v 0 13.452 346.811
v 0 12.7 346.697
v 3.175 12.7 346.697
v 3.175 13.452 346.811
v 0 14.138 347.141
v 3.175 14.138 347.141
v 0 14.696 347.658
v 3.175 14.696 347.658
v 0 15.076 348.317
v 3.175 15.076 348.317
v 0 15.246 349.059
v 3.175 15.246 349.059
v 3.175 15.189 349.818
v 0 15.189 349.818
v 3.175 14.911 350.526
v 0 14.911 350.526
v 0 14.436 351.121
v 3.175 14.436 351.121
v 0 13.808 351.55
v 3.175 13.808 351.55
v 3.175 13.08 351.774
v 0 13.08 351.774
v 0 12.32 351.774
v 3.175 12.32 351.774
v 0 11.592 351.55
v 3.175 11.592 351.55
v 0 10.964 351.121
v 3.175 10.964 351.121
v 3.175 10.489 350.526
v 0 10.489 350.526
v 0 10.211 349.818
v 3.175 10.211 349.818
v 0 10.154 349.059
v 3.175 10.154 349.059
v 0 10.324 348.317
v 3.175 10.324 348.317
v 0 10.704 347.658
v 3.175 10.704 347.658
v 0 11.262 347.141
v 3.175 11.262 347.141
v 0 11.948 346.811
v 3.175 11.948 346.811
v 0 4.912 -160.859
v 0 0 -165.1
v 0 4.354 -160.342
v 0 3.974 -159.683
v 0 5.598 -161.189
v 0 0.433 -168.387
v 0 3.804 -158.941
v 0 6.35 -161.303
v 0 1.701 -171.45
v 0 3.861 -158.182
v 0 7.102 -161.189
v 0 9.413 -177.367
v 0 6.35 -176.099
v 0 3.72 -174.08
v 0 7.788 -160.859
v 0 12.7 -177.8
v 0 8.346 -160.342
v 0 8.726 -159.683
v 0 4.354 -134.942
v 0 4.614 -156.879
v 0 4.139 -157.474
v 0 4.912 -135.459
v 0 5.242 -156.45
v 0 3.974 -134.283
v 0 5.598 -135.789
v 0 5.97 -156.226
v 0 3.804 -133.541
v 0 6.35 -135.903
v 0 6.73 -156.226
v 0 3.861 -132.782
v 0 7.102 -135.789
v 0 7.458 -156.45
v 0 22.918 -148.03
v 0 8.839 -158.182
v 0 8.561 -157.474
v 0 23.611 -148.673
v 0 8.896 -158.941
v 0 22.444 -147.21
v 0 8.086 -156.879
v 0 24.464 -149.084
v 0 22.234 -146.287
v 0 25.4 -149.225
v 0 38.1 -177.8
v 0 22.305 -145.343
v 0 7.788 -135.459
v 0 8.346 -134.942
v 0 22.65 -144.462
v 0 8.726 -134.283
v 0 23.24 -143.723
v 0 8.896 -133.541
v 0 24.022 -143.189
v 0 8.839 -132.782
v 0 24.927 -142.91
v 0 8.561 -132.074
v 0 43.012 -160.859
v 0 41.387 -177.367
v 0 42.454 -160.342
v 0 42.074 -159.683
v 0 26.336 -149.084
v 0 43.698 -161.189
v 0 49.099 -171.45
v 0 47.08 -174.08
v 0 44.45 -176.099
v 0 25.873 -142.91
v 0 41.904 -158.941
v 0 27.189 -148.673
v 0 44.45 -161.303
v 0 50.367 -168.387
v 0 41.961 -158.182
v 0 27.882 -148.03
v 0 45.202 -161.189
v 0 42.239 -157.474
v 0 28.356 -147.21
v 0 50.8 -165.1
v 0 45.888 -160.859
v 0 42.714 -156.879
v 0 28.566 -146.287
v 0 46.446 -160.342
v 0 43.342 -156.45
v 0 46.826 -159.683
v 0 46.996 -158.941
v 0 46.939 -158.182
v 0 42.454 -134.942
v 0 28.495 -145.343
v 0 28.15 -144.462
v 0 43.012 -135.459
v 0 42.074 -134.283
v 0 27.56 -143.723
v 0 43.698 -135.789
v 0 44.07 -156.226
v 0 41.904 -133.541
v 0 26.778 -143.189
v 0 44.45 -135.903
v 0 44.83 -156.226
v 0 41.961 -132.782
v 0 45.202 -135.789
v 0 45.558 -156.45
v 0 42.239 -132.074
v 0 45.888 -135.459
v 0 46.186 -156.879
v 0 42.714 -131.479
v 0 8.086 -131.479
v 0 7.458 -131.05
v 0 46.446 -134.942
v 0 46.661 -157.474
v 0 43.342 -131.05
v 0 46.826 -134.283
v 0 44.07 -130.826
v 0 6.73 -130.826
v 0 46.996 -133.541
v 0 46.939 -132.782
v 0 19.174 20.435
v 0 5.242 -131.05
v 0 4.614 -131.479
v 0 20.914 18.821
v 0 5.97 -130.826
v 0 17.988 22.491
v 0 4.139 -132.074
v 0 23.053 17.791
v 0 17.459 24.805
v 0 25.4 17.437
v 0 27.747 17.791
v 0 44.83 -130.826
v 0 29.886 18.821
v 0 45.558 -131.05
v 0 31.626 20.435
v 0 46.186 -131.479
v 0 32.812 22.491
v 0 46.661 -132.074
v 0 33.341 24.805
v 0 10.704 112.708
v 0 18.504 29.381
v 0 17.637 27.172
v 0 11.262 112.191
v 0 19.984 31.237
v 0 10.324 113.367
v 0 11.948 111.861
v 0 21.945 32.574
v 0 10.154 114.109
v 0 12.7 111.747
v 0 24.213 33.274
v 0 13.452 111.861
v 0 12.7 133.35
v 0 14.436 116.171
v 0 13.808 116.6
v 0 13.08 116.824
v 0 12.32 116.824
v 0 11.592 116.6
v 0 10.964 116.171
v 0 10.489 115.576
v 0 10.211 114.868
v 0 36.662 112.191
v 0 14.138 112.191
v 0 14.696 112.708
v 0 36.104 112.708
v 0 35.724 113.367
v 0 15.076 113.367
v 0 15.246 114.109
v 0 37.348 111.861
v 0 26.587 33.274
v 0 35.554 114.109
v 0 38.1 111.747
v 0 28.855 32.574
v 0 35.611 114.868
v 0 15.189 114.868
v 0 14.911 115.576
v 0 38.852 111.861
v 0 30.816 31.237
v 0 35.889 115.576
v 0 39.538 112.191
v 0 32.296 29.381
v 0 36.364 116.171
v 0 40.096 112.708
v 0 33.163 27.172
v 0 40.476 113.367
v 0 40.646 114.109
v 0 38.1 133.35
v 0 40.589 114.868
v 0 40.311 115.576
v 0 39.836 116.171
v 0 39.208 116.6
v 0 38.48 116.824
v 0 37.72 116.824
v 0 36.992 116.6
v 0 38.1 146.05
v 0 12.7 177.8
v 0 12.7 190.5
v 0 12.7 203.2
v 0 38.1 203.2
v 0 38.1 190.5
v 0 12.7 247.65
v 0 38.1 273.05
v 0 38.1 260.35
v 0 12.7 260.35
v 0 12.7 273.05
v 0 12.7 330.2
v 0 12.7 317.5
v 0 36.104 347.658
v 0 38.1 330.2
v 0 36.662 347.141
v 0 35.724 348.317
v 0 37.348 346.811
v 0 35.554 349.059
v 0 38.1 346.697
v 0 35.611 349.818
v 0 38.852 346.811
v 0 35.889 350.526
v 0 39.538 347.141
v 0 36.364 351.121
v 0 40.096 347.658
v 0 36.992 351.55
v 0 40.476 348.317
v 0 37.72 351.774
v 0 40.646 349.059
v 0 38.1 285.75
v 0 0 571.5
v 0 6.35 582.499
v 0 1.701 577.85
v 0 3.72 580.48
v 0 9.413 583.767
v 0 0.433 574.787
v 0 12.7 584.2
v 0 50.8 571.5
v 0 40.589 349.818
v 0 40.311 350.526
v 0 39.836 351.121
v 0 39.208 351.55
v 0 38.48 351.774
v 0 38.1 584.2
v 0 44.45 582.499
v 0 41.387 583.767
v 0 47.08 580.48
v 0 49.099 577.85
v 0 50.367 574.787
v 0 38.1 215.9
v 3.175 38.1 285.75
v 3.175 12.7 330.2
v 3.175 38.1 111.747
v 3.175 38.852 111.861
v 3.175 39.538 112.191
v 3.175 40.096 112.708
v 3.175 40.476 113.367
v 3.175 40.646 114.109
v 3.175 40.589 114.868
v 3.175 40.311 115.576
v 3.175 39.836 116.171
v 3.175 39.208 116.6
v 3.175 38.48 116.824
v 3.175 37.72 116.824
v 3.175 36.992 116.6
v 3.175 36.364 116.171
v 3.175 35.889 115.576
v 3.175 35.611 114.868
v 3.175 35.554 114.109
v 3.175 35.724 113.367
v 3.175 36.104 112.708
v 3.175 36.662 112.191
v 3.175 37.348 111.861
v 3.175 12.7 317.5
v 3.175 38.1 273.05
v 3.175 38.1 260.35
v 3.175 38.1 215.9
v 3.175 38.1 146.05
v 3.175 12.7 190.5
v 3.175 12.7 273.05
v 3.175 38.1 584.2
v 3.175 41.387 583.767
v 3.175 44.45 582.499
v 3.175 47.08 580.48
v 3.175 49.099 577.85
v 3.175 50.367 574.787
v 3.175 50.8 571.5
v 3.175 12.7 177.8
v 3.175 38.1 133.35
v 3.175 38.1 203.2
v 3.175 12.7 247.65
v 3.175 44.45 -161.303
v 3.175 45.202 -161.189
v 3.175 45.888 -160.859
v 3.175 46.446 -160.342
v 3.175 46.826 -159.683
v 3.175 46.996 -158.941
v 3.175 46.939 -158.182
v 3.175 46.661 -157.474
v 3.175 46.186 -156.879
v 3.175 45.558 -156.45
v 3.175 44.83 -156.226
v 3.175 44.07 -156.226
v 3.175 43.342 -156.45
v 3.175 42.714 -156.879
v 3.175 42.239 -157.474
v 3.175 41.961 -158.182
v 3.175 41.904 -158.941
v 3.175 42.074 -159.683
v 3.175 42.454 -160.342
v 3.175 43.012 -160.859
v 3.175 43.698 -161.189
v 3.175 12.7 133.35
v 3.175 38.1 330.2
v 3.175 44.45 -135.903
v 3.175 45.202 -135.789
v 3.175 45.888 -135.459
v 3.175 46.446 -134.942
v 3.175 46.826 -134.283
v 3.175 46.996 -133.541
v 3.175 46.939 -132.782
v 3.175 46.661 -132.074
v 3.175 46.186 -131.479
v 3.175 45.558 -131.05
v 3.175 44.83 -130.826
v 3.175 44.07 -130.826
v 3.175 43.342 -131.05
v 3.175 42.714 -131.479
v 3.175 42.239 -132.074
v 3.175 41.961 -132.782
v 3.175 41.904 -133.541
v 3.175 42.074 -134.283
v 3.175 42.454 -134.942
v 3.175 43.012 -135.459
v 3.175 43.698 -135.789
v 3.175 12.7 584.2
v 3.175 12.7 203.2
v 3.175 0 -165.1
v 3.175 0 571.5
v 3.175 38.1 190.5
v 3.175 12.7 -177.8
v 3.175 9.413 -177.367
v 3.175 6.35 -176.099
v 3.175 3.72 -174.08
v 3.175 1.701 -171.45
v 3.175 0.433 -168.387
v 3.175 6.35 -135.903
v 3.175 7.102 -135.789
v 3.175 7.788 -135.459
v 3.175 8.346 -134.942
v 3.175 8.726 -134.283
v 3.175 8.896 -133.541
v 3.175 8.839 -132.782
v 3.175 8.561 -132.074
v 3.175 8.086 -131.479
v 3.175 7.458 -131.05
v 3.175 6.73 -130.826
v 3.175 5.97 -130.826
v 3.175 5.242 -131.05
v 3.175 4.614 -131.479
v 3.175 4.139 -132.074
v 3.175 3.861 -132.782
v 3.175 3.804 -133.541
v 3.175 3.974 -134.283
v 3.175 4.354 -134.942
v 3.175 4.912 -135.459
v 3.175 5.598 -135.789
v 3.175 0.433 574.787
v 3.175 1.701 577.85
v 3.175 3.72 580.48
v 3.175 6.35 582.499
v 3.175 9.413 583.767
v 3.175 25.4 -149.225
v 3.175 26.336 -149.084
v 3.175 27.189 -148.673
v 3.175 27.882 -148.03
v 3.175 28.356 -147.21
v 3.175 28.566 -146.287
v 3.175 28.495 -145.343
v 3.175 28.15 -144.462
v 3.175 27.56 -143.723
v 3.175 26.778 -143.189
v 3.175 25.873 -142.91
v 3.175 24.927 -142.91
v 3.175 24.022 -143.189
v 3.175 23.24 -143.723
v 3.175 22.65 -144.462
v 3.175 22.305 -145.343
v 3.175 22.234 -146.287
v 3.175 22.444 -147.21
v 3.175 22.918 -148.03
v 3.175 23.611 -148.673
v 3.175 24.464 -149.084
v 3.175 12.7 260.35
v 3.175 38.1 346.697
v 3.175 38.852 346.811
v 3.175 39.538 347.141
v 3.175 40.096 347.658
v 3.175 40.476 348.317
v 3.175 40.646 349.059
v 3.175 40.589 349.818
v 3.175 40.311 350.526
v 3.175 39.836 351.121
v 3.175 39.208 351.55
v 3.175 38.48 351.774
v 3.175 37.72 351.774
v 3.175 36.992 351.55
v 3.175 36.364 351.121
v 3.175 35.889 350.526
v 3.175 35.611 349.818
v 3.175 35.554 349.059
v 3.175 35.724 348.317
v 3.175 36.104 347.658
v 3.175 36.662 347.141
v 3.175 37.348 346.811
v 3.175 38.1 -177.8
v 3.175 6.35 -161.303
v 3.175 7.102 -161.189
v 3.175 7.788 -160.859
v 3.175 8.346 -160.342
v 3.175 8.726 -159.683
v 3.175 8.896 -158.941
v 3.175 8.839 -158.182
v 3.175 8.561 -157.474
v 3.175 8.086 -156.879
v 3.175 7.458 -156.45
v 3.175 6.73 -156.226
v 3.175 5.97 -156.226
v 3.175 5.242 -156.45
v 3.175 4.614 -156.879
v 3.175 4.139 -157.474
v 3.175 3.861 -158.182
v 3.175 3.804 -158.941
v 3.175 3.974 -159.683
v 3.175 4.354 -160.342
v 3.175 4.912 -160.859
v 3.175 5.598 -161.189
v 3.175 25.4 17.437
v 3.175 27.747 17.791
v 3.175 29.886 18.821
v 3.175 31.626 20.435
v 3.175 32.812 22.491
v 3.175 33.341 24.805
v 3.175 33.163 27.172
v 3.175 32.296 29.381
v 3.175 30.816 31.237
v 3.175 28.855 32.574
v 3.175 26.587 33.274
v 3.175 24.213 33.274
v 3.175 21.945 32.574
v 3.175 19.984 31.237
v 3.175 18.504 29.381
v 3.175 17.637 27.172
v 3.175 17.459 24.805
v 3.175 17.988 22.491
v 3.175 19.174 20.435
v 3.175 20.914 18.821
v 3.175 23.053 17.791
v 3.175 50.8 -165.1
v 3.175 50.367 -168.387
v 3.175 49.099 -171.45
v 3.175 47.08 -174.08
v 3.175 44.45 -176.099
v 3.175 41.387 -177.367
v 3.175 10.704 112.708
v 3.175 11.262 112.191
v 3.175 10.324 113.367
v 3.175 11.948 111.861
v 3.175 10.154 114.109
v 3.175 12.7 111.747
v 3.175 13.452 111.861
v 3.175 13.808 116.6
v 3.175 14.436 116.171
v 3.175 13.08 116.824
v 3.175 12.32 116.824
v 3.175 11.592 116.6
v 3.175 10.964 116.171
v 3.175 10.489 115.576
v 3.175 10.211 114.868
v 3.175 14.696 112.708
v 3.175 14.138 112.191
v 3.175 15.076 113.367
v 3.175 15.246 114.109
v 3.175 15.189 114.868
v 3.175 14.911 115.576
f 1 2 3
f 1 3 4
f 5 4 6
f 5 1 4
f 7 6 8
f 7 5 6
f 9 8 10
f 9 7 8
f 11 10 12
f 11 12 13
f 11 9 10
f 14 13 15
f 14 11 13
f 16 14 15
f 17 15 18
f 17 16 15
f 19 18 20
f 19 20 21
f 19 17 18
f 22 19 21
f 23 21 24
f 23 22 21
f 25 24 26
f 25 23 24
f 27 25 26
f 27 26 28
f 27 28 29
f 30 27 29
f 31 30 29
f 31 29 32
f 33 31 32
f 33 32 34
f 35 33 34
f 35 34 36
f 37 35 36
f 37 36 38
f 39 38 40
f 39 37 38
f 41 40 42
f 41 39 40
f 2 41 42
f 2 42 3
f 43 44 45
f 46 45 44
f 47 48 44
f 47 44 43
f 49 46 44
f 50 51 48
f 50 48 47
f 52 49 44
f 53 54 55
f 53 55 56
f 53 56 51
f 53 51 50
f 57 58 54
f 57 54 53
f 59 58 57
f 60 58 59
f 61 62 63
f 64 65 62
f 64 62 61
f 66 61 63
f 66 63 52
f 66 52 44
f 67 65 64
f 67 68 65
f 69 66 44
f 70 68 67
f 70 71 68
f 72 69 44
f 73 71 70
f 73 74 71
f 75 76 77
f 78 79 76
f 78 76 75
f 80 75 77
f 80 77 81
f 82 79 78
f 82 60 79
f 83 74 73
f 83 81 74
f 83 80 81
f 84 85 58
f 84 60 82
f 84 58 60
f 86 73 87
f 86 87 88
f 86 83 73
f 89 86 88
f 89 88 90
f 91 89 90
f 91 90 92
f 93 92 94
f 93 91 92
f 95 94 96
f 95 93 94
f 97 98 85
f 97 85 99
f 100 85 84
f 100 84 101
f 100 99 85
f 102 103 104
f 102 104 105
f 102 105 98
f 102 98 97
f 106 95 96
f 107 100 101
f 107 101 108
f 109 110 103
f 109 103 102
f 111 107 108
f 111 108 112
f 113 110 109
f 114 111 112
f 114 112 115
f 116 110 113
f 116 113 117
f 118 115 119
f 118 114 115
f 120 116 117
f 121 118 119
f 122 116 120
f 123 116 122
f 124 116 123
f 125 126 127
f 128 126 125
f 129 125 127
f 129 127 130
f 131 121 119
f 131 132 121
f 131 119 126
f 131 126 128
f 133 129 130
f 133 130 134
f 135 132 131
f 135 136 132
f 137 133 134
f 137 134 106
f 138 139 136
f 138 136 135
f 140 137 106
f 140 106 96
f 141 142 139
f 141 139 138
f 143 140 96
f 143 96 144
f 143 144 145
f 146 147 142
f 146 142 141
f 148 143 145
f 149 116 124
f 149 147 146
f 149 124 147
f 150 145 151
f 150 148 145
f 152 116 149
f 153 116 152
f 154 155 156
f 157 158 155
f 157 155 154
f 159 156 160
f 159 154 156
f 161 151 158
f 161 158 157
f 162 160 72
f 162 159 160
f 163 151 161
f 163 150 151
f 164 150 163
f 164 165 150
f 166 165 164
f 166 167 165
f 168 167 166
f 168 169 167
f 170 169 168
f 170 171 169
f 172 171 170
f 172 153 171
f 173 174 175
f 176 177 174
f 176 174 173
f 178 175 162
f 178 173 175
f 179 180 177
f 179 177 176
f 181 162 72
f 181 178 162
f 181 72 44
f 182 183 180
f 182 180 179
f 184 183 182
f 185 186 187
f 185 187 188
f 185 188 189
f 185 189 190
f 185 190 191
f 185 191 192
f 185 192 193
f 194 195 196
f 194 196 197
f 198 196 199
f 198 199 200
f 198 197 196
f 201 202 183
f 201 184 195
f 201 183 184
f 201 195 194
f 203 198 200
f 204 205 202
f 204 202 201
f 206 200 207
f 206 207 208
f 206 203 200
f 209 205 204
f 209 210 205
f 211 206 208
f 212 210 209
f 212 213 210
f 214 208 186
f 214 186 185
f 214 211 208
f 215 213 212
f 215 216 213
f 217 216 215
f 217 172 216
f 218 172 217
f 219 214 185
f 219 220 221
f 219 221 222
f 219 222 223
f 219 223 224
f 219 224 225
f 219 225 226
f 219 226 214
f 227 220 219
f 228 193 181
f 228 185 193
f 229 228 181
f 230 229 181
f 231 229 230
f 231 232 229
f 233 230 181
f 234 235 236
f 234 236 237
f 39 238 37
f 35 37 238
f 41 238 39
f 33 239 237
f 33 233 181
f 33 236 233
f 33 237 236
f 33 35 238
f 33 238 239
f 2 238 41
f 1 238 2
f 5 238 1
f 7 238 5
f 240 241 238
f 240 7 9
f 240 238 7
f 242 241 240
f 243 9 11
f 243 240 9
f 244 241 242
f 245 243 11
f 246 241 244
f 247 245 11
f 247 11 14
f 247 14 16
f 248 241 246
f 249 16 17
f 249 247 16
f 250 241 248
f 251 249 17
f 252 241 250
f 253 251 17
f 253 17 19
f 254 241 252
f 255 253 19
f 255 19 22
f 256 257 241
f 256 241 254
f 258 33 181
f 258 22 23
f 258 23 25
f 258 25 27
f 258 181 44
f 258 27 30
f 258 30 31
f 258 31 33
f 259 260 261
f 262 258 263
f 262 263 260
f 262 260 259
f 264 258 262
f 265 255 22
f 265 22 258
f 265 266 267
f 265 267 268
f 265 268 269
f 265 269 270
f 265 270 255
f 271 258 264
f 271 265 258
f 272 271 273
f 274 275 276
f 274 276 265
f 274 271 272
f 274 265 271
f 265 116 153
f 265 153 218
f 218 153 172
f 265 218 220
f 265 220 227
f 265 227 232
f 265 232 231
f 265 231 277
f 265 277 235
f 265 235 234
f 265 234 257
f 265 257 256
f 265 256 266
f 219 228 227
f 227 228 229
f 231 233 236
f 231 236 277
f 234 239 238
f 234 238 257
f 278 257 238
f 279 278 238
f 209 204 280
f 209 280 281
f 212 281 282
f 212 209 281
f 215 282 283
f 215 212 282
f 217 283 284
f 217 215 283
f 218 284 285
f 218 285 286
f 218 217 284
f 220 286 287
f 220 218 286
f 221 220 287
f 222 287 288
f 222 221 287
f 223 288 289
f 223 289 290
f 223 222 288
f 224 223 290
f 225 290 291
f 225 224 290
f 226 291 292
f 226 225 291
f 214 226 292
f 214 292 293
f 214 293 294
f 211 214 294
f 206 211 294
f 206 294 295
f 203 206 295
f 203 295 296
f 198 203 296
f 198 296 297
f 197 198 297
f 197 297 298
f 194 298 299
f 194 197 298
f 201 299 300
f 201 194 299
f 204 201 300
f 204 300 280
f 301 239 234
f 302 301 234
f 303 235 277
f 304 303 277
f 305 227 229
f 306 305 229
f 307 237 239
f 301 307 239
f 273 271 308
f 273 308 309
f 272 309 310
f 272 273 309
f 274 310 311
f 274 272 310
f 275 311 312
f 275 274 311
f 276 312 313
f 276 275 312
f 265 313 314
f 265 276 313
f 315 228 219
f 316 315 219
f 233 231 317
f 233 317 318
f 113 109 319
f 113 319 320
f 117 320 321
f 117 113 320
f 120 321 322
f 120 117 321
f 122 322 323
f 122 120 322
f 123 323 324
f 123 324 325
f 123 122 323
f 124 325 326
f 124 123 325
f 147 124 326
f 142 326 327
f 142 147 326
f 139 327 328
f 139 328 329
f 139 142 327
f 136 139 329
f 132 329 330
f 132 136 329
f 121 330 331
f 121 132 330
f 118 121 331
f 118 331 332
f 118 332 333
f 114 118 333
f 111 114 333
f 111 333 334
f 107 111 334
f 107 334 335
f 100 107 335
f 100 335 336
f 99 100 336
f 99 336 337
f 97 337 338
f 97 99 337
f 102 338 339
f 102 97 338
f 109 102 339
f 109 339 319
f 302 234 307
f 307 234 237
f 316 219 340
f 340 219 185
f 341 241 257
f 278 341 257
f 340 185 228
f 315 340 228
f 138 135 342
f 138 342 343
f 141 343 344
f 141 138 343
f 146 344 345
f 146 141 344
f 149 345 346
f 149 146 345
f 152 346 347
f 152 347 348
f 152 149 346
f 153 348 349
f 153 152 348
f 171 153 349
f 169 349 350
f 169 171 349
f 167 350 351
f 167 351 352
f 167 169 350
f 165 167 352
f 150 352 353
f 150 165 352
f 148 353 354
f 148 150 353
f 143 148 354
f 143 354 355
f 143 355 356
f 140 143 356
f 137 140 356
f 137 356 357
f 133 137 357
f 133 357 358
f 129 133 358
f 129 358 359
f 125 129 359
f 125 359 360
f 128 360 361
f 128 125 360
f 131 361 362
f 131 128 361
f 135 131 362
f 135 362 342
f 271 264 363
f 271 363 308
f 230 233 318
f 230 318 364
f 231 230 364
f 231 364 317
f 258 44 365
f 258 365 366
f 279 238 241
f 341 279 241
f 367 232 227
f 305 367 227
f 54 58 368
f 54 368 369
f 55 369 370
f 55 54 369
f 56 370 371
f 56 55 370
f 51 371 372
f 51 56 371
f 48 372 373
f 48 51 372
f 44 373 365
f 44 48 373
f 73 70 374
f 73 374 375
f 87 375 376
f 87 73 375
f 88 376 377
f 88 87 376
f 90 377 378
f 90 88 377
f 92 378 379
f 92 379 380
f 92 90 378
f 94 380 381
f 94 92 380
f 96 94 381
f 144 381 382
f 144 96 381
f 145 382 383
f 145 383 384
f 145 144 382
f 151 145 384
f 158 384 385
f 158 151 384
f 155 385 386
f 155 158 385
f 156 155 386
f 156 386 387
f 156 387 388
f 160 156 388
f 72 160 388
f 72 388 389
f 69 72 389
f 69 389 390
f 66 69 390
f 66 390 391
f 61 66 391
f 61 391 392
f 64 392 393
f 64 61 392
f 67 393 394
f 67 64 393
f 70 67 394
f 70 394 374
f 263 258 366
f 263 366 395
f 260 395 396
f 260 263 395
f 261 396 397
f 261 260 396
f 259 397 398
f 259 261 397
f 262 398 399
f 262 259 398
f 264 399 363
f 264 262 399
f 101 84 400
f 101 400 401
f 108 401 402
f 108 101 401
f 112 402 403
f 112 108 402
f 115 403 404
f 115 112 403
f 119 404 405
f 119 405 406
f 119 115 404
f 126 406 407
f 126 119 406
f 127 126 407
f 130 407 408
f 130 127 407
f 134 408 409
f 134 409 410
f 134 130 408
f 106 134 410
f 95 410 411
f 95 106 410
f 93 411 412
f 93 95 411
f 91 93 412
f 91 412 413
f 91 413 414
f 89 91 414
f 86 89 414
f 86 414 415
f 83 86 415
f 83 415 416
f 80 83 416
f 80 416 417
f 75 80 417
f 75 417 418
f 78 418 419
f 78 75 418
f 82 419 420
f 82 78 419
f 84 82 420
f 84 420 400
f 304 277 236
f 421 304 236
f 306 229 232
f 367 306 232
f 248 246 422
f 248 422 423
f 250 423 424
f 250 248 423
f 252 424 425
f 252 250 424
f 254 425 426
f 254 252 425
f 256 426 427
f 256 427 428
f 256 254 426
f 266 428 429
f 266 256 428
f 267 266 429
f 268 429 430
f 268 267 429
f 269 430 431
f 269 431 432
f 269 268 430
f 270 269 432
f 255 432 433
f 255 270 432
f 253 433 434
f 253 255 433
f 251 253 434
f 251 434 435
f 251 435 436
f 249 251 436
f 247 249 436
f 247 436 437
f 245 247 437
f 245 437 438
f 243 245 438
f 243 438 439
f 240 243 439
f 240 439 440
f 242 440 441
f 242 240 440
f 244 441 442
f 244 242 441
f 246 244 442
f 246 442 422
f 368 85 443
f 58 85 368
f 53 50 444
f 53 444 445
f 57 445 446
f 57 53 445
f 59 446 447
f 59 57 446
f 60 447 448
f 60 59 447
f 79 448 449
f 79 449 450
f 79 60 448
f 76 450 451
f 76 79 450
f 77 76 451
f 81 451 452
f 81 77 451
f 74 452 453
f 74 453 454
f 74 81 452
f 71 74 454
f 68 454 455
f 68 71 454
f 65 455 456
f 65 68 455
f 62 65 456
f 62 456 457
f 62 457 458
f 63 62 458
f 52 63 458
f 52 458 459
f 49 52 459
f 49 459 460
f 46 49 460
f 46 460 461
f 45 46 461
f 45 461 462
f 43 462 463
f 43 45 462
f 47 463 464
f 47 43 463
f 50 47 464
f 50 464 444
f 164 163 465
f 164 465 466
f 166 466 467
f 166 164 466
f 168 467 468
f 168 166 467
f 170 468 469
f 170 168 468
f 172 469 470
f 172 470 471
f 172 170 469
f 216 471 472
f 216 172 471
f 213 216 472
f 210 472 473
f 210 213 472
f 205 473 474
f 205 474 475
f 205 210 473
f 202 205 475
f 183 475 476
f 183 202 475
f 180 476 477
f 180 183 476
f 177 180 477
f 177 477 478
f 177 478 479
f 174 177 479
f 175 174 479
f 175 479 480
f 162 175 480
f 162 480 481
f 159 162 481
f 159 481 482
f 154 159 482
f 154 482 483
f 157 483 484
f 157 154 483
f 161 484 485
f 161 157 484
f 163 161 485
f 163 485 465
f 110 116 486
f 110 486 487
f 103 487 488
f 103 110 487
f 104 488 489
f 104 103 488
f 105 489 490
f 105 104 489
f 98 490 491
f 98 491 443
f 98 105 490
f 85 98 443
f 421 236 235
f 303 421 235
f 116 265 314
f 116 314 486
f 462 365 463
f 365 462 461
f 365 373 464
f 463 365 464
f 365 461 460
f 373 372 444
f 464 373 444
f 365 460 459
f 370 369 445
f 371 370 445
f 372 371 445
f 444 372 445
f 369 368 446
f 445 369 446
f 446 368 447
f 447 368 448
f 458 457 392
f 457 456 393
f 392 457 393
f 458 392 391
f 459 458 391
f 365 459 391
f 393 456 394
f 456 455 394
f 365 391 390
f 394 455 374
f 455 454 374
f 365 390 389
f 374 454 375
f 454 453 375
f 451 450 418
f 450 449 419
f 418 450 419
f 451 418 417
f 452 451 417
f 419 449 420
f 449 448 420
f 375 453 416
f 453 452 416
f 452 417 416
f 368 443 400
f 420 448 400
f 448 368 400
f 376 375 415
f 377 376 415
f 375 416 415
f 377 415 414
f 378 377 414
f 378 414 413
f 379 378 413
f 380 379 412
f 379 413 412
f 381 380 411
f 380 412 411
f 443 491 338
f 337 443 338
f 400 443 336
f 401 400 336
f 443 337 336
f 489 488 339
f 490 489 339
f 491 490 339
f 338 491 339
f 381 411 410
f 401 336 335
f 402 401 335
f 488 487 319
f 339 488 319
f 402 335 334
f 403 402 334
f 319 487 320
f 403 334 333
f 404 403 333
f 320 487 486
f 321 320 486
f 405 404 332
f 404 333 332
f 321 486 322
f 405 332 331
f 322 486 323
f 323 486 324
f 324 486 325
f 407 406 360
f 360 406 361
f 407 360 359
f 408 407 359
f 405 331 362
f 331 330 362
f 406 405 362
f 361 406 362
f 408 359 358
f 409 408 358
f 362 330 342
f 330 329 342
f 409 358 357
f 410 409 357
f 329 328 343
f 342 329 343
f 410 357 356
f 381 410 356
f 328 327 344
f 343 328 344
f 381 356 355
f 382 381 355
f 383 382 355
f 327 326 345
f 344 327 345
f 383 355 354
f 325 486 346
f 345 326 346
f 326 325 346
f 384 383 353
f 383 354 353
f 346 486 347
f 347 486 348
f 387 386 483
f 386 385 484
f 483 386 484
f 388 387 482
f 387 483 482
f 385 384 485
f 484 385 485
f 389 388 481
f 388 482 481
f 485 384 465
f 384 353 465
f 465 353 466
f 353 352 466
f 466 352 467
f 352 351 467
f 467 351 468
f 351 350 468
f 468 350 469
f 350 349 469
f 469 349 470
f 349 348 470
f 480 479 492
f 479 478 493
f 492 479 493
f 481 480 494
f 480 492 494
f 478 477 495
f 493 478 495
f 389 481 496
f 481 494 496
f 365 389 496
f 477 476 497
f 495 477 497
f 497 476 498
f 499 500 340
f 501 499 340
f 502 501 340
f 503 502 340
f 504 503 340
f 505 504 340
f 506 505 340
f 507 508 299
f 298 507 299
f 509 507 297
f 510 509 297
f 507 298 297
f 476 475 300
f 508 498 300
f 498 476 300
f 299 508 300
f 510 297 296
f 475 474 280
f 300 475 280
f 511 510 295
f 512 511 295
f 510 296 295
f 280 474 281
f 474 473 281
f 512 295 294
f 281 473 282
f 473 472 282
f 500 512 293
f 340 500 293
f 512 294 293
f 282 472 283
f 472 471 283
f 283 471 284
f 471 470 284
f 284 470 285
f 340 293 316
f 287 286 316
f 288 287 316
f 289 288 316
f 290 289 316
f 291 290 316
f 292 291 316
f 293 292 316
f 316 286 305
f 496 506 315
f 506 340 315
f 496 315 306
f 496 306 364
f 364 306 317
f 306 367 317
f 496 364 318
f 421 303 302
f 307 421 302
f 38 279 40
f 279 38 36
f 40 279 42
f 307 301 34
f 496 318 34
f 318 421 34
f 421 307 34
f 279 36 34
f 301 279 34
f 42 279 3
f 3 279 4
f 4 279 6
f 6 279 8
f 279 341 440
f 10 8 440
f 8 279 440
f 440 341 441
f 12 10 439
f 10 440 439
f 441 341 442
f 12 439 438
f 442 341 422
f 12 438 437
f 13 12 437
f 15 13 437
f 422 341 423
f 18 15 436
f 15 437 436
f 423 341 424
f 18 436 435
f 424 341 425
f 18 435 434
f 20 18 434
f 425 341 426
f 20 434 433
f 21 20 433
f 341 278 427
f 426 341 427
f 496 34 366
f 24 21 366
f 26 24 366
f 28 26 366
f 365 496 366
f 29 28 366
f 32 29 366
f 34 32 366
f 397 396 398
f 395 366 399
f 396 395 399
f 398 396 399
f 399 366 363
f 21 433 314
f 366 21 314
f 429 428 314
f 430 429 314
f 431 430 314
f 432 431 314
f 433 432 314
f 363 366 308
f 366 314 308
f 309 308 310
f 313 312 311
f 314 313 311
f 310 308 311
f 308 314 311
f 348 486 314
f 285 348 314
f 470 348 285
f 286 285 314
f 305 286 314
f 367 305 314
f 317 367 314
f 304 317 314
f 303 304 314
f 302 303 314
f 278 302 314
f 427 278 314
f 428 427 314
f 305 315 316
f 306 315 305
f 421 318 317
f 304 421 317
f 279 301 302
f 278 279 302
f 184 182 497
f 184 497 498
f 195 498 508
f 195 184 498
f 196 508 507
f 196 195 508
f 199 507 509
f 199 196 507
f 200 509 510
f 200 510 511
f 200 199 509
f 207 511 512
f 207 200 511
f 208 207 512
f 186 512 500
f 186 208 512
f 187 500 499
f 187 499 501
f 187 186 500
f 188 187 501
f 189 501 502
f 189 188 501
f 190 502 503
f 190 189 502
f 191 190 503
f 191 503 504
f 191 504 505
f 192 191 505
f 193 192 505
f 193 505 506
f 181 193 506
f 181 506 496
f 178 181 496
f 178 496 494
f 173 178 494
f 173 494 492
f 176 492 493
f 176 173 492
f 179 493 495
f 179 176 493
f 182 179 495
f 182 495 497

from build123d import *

# Parameters (mm, degrees)
SKETCH1_R           = 7.9629
SKETCH1_R_2         = 3.175
SKETCH1_R_3         = 2.5527
BOSS_EXTRUDE1_DEPTH = 3.175


with BuildPart() as part:
    # Sketch1 → Boss-Extrude1 (new body)
    with BuildSketch(Plane(origin=(0, 0, 0), x_dir=(0, 0, -1), z_dir=(1, 0, 0))):
        with BuildLine():
            Line((177.8, 38.1), (177.8, 12.7))
            ThreePointArc((177.8, 12.7), (174.080256121, 3.719743879), (165.1, 0))
            Line((165.1, 0), (-571.5, 0))
            ThreePointArc((-571.5, 0), (-580.480256121, 3.719743879), (-584.2, 12.7))
            Line((-584.2, 12.7), (-584.2, 38.1))
            ThreePointArc((-584.2, 38.1), (-580.480256121, 47.080256121), (-571.5, 50.8))
            Line((-571.5, 50.8), (165.1, 50.8))
            ThreePointArc((165.1, 50.8), (174.080256121, 47.080256121), (177.8, 38.1))
        make_face()
        with Locations((-25.4, 25.4)):
            Circle(SKETCH1_R, mode=Mode.SUBTRACT)
        with Locations((146.05, 25.4)):
            Circle(SKETCH1_R_2, mode=Mode.SUBTRACT)
        with Locations((-349.25, 38.1)):
            Circle(SKETCH1_R_3, mode=Mode.SUBTRACT)
        with Locations((-349.25, 12.7)):
            Circle(SKETCH1_R_3, mode=Mode.SUBTRACT)
        with Locations((-114.3, 38.1)):
            Circle(SKETCH1_R_3, mode=Mode.SUBTRACT)
        with Locations((-114.3, 12.7)):
            Circle(SKETCH1_R_3, mode=Mode.SUBTRACT)
        with Locations((133.35, 44.45)):
            Circle(SKETCH1_R_3, mode=Mode.SUBTRACT)
        with Locations((158.75, 44.45)):
            Circle(SKETCH1_R_3, mode=Mode.SUBTRACT)
        with Locations((158.75, 6.35)):
            Circle(SKETCH1_R_3, mode=Mode.SUBTRACT)
        with Locations((133.35, 6.35)):
            Circle(SKETCH1_R_3, mode=Mode.SUBTRACT)
        Polygon((-190.5, 38.1), (-146.05, 38.1), (-190.5, 12.7), align=None, mode=Mode.SUBTRACT)
        Polygon((-133.35, 38.1), (-133.35, 12.7), (-177.8, 12.7), align=None, mode=Mode.SUBTRACT)
        Polygon((-203.2, 12.7), (-203.2, 38.1), (-247.65, 12.7), align=None, mode=Mode.SUBTRACT)
        Polygon((-215.9, 38.1), (-260.35, 12.7), (-260.35, 38.1), align=None, mode=Mode.SUBTRACT)
        Polygon((-273.05, 38.1), (-273.05, 12.7), (-317.5, 12.7), align=None, mode=Mode.SUBTRACT)
        Polygon((-330.2, 12.7), (-330.2, 38.1), (-285.75, 38.1), align=None, mode=Mode.SUBTRACT)
    extrude(amount=BOSS_EXTRUDE1_DEPTH)


solid = part.part
